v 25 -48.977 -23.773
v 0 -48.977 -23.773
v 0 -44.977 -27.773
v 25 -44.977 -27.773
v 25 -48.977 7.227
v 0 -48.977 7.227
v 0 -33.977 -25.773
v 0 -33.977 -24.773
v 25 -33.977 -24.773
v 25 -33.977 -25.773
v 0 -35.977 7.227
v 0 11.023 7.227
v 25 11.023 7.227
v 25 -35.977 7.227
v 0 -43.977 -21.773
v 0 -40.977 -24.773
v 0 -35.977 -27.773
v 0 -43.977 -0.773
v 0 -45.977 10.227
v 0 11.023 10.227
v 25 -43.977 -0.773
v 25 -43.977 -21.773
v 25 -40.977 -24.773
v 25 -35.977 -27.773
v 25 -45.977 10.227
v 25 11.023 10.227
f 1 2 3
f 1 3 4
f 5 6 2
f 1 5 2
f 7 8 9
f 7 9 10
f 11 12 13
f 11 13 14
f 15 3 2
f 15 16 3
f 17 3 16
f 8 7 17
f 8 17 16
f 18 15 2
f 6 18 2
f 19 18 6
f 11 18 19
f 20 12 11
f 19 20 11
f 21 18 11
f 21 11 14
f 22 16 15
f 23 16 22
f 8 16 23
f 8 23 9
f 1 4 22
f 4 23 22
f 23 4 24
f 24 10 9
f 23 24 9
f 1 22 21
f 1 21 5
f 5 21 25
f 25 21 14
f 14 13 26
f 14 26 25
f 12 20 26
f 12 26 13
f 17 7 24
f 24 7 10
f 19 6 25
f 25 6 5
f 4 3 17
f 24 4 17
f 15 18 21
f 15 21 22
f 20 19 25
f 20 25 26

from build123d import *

# Parameters (mm, degrees)
BOSS_EXTRUDE1_DEPTH = 25
CHAMFER1_SIZE       = 8
CHAMFER2_SIZE       = 3
CHAMFER3_SIZE       = 4
CHAMFER4_SIZE       = 2


with BuildPart() as part:
    # Sketch1 → Boss-Extrude1 (new body)
    with BuildSketch(Plane(origin=(0, 0, 0), x_dir=(0, 0, -1), z_dir=(1, 0, 0))):
        Polygon((-10.227272727, 11.022727273), (-7.227272727, 11.022727273), (-7.227272727, -43.977272727), (24.772727273, -43.977272727), (24.772727273, -33.977272727), (27.772727273, -33.977272727), (27.772727273, -43.977272727), (27.772727273, -48.977272727), (-7.227272727, -48.977272727), (-10.227272727, -48.977272727), align=None)
    extrude(amount=BOSS_EXTRUDE1_DEPTH)

    # Chamfer1
    chamfer1_edges = [part.edges().sort_by_distance(p)[0] for p in [
        (12.5, -43.977272727, 7.227272727),
    ]]
    chamfer(chamfer1_edges, length=CHAMFER1_SIZE)

    # Chamfer2
    chamfer2_edges = [part.edges().sort_by_distance(p)[0] for p in [
        (12.5, -43.977272727, -24.772727273),
        (12.5, -48.977272727, 10.227272727),
    ]]
    chamfer(chamfer2_edges, length=CHAMFER2_SIZE)

    # Chamfer3
    chamfer3_edges = [part.edges().sort_by_distance(p)[0] for p in [
        (12.5, -48.977272727, -27.772727273),
    ]]
    chamfer(chamfer3_edges, length=CHAMFER3_SIZE)

    # Chamfer4
    chamfer4_edges = [part.edges().sort_by_distance(p)[0] for p in [
        (12.5, -33.977272727, -27.772727273),
    ]]
    chamfer(chamfer4_edges, length=CHAMFER4_SIZE)


solid = part.part
